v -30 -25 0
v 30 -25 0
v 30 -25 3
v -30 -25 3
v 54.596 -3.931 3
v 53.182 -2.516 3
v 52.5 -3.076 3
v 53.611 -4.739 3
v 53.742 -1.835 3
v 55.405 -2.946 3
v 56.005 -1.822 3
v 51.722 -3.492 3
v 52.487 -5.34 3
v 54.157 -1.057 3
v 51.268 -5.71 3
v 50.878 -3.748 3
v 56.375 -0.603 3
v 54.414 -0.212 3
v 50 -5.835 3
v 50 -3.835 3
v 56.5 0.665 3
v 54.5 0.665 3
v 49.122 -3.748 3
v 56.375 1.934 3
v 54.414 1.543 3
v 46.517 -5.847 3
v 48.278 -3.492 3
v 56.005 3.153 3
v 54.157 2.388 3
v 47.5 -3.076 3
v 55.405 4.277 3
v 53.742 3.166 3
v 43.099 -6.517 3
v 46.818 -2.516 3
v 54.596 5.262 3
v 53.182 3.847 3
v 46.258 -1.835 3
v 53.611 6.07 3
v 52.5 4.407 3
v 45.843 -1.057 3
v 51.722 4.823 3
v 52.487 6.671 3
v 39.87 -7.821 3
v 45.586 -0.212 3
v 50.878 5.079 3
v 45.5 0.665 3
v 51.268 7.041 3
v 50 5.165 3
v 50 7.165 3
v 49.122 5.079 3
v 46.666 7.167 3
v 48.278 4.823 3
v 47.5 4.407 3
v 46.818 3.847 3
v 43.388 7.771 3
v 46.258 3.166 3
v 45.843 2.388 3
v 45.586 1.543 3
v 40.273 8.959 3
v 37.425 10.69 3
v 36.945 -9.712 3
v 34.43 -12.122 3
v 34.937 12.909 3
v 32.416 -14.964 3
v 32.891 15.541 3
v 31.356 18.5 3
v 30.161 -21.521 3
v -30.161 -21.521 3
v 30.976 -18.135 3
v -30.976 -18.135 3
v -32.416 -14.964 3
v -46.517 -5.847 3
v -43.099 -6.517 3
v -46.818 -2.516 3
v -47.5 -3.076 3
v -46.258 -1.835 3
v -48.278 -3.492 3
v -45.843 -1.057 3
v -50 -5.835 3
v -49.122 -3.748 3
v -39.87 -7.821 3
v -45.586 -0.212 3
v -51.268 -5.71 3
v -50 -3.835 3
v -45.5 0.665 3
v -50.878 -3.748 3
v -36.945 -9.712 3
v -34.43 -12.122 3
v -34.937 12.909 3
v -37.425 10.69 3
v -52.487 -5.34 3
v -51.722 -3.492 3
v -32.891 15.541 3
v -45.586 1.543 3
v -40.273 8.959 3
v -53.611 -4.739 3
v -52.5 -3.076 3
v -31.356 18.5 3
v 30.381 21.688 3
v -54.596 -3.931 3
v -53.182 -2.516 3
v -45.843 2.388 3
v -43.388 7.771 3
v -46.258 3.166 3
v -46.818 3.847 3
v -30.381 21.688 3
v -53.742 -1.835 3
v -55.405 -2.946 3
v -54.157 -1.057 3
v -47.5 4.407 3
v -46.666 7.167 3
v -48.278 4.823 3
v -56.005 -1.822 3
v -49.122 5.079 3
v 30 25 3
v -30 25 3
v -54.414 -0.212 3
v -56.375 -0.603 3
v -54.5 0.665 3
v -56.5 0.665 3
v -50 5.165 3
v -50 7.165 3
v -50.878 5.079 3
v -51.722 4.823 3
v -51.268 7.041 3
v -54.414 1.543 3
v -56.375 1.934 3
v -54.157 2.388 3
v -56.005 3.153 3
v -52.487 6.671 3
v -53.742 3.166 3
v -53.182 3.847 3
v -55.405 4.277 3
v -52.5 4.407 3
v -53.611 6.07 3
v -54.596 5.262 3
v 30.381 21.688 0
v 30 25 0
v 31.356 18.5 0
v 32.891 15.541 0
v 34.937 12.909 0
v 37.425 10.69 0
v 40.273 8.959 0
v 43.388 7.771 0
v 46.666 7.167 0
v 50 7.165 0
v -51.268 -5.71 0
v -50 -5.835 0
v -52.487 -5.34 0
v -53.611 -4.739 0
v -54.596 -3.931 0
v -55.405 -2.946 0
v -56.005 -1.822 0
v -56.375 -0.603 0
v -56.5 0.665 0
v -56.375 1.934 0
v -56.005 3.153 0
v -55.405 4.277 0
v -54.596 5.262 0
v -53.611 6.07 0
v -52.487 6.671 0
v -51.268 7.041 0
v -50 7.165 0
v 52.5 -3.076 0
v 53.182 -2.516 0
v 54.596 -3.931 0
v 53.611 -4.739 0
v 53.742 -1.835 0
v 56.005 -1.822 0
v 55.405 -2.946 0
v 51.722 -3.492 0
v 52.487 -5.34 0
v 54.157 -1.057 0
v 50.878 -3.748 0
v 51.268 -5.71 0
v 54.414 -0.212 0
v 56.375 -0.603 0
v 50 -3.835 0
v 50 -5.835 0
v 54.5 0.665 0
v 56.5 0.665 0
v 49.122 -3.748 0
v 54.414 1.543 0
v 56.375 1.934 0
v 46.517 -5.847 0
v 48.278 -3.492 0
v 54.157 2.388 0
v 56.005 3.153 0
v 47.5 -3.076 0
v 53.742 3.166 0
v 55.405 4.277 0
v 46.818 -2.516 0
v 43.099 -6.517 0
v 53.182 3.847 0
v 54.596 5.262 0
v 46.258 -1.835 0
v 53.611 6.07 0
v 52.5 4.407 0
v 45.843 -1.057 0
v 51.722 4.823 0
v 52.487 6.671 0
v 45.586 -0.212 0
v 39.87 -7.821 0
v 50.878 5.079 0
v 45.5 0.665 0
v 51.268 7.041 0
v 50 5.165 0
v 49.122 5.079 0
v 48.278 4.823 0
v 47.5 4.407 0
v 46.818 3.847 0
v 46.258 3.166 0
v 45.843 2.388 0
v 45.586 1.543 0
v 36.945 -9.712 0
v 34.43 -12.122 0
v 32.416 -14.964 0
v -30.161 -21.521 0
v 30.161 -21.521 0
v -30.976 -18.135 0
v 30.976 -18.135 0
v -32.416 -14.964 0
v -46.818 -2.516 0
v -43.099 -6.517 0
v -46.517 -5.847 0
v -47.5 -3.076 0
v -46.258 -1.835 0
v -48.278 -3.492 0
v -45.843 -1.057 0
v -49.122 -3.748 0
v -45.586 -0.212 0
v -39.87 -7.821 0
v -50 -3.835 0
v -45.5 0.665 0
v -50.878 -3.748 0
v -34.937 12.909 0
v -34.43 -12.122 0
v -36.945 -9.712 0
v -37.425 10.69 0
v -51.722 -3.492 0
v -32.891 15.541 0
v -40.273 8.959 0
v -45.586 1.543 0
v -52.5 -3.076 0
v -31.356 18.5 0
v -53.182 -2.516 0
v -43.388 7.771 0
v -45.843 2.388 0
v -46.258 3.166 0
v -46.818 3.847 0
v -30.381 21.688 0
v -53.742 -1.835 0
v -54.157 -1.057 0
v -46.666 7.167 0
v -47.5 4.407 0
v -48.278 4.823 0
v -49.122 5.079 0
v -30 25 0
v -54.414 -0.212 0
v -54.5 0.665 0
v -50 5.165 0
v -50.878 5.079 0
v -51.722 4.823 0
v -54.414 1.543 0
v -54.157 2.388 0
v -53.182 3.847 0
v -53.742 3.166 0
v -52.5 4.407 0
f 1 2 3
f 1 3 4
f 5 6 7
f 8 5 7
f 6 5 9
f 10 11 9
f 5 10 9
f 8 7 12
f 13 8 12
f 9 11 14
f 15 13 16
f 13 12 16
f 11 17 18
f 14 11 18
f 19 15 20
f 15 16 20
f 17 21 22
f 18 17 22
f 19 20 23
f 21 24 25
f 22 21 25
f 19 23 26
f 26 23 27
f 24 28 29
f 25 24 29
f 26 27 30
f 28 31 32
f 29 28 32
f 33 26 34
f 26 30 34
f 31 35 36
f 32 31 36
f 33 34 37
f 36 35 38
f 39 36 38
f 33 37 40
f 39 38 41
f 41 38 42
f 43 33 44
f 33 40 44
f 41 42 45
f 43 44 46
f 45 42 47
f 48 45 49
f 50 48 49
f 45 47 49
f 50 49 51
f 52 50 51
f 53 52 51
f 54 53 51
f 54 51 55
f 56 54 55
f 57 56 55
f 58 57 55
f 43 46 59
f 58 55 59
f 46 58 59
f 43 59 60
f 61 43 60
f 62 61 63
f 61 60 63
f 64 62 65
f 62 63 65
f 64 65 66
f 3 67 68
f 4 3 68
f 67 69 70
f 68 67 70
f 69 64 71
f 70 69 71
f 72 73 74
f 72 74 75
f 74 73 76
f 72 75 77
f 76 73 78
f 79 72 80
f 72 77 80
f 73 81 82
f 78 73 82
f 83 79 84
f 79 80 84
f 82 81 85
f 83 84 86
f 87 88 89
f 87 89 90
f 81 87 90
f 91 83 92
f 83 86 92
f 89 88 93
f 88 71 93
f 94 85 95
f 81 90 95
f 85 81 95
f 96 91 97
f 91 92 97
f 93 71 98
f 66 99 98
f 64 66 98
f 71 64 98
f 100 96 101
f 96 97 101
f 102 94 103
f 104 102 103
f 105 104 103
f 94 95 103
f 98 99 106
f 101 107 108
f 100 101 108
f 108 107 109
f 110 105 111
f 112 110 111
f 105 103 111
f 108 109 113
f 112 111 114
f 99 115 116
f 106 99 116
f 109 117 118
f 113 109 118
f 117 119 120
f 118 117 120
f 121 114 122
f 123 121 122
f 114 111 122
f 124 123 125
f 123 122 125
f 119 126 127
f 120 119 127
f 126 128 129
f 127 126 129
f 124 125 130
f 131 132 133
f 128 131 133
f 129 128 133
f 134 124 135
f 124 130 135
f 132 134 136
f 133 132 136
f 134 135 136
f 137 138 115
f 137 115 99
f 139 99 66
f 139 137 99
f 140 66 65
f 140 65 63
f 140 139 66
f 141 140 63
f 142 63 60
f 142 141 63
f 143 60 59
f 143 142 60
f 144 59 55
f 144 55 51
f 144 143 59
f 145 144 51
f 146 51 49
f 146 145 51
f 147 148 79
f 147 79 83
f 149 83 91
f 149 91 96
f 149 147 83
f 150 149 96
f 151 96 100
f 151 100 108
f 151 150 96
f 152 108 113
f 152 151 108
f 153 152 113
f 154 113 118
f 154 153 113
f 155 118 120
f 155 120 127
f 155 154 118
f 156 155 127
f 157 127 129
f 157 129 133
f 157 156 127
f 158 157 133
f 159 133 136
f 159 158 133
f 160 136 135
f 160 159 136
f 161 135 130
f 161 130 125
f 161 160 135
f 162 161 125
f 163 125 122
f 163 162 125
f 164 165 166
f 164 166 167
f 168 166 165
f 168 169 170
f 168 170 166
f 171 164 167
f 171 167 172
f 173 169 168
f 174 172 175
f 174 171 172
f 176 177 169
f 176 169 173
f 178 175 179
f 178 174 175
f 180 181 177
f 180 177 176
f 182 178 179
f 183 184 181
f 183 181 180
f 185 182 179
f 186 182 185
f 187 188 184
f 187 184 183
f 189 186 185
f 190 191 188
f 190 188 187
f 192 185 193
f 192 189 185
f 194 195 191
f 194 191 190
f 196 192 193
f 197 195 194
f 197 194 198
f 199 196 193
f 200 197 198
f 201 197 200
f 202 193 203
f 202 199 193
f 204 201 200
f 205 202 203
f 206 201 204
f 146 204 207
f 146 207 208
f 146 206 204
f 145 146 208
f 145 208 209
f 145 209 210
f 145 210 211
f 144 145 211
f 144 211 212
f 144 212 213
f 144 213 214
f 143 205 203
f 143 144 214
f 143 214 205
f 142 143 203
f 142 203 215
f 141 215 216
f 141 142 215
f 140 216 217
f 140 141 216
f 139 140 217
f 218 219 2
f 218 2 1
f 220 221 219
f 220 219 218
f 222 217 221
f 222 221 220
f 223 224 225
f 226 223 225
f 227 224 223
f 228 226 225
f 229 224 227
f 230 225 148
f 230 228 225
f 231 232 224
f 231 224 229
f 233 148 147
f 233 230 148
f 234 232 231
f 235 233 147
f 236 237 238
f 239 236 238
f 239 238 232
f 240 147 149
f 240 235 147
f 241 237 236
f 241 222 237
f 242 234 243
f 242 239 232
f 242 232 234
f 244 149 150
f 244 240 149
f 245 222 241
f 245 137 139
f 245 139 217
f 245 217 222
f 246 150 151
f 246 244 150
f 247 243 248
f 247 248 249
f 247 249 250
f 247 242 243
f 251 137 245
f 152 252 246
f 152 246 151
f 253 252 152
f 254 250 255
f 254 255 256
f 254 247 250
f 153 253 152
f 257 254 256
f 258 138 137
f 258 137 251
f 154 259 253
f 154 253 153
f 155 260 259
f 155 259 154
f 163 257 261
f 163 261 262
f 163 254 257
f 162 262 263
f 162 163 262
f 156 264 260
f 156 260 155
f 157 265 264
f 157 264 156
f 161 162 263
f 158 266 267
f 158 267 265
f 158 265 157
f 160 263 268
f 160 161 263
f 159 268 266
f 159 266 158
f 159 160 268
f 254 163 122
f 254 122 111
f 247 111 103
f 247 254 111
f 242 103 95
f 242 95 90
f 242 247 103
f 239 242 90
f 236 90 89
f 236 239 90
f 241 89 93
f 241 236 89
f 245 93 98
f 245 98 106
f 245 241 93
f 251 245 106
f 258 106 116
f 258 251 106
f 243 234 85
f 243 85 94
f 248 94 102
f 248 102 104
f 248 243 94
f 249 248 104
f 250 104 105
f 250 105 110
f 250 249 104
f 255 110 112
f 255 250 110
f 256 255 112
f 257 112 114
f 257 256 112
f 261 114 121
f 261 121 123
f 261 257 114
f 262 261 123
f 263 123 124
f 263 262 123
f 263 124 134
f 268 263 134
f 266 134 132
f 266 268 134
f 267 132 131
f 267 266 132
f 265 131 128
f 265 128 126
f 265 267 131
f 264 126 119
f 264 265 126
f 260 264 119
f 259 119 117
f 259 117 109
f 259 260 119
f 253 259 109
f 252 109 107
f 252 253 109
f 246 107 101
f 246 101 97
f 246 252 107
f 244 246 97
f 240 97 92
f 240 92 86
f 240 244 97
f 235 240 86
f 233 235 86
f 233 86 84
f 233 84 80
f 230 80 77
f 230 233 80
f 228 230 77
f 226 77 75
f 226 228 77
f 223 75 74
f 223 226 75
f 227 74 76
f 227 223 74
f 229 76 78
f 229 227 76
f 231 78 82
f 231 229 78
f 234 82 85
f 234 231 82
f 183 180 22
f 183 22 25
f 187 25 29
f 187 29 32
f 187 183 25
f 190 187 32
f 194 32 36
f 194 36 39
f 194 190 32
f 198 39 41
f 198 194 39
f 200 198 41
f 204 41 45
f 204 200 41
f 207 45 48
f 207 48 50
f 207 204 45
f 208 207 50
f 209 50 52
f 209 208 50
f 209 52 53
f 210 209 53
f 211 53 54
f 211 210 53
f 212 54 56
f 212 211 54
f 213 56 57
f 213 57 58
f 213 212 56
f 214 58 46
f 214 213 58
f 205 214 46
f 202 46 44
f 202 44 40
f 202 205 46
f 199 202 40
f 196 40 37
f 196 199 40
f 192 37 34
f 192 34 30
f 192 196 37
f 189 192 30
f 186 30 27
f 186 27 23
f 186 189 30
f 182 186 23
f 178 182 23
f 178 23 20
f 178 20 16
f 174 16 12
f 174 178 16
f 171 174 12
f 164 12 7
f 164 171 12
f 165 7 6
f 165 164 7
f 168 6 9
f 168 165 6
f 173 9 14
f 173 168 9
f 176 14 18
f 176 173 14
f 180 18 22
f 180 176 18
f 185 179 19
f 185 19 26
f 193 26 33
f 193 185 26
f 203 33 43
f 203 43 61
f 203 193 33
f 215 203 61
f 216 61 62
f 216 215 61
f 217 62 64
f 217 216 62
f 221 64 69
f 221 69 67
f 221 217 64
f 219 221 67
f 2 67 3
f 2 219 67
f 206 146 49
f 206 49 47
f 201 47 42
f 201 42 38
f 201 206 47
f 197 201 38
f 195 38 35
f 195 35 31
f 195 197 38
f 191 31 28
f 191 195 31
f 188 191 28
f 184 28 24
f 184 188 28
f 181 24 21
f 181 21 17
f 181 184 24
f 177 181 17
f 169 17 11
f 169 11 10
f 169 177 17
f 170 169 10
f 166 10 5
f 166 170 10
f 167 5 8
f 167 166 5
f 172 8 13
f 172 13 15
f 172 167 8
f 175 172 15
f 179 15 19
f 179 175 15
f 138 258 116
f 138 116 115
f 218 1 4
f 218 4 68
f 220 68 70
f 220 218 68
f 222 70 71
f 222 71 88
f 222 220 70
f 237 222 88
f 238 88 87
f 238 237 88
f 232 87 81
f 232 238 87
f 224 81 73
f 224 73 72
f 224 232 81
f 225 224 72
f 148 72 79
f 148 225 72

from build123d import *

# Parameters (mm, degrees)
SKETCH2_R           = 4.5
BOSS_EXTRUDE2_DEPTH = 3


with BuildPart() as part:
    # Sketch2 → Boss-Extrude2 (new body)
    with BuildSketch(Plane.XY):
        with BuildLine():
            ThreePointArc((-50, -5.834500909), (-56.5, 0.665499091), (-50, 7.165499091))
            ThreePointArc((-50, 7.165499091), (-36.130190824, 11.743060763), (-30, 25))
            Line((-30, 25), (30, 25))
            ThreePointArc((30, 25), (36.130190824, 11.743060763), (50, 7.165499091))
            ThreePointArc((50, 7.165499091), (56.5, 0.665499091), (50, -5.834500909))
            ThreePointArc((50, -5.834500909), (35.63018968, -10.857170595), (30, -25))
            Line((30, -25), (-30, -25))
            ThreePointArc((-30, -25), (-35.63018968, -10.857170595), (-50, -5.834500909))
        make_face()
        with Locations((50, 0.665499091)):
            Circle(SKETCH2_R, mode=Mode.SUBTRACT)
        with Locations((-50, 0.665499091)):
            Circle(SKETCH2_R, mode=Mode.SUBTRACT)
    extrude(amount=BOSS_EXTRUDE2_DEPTH)


solid = part.part
